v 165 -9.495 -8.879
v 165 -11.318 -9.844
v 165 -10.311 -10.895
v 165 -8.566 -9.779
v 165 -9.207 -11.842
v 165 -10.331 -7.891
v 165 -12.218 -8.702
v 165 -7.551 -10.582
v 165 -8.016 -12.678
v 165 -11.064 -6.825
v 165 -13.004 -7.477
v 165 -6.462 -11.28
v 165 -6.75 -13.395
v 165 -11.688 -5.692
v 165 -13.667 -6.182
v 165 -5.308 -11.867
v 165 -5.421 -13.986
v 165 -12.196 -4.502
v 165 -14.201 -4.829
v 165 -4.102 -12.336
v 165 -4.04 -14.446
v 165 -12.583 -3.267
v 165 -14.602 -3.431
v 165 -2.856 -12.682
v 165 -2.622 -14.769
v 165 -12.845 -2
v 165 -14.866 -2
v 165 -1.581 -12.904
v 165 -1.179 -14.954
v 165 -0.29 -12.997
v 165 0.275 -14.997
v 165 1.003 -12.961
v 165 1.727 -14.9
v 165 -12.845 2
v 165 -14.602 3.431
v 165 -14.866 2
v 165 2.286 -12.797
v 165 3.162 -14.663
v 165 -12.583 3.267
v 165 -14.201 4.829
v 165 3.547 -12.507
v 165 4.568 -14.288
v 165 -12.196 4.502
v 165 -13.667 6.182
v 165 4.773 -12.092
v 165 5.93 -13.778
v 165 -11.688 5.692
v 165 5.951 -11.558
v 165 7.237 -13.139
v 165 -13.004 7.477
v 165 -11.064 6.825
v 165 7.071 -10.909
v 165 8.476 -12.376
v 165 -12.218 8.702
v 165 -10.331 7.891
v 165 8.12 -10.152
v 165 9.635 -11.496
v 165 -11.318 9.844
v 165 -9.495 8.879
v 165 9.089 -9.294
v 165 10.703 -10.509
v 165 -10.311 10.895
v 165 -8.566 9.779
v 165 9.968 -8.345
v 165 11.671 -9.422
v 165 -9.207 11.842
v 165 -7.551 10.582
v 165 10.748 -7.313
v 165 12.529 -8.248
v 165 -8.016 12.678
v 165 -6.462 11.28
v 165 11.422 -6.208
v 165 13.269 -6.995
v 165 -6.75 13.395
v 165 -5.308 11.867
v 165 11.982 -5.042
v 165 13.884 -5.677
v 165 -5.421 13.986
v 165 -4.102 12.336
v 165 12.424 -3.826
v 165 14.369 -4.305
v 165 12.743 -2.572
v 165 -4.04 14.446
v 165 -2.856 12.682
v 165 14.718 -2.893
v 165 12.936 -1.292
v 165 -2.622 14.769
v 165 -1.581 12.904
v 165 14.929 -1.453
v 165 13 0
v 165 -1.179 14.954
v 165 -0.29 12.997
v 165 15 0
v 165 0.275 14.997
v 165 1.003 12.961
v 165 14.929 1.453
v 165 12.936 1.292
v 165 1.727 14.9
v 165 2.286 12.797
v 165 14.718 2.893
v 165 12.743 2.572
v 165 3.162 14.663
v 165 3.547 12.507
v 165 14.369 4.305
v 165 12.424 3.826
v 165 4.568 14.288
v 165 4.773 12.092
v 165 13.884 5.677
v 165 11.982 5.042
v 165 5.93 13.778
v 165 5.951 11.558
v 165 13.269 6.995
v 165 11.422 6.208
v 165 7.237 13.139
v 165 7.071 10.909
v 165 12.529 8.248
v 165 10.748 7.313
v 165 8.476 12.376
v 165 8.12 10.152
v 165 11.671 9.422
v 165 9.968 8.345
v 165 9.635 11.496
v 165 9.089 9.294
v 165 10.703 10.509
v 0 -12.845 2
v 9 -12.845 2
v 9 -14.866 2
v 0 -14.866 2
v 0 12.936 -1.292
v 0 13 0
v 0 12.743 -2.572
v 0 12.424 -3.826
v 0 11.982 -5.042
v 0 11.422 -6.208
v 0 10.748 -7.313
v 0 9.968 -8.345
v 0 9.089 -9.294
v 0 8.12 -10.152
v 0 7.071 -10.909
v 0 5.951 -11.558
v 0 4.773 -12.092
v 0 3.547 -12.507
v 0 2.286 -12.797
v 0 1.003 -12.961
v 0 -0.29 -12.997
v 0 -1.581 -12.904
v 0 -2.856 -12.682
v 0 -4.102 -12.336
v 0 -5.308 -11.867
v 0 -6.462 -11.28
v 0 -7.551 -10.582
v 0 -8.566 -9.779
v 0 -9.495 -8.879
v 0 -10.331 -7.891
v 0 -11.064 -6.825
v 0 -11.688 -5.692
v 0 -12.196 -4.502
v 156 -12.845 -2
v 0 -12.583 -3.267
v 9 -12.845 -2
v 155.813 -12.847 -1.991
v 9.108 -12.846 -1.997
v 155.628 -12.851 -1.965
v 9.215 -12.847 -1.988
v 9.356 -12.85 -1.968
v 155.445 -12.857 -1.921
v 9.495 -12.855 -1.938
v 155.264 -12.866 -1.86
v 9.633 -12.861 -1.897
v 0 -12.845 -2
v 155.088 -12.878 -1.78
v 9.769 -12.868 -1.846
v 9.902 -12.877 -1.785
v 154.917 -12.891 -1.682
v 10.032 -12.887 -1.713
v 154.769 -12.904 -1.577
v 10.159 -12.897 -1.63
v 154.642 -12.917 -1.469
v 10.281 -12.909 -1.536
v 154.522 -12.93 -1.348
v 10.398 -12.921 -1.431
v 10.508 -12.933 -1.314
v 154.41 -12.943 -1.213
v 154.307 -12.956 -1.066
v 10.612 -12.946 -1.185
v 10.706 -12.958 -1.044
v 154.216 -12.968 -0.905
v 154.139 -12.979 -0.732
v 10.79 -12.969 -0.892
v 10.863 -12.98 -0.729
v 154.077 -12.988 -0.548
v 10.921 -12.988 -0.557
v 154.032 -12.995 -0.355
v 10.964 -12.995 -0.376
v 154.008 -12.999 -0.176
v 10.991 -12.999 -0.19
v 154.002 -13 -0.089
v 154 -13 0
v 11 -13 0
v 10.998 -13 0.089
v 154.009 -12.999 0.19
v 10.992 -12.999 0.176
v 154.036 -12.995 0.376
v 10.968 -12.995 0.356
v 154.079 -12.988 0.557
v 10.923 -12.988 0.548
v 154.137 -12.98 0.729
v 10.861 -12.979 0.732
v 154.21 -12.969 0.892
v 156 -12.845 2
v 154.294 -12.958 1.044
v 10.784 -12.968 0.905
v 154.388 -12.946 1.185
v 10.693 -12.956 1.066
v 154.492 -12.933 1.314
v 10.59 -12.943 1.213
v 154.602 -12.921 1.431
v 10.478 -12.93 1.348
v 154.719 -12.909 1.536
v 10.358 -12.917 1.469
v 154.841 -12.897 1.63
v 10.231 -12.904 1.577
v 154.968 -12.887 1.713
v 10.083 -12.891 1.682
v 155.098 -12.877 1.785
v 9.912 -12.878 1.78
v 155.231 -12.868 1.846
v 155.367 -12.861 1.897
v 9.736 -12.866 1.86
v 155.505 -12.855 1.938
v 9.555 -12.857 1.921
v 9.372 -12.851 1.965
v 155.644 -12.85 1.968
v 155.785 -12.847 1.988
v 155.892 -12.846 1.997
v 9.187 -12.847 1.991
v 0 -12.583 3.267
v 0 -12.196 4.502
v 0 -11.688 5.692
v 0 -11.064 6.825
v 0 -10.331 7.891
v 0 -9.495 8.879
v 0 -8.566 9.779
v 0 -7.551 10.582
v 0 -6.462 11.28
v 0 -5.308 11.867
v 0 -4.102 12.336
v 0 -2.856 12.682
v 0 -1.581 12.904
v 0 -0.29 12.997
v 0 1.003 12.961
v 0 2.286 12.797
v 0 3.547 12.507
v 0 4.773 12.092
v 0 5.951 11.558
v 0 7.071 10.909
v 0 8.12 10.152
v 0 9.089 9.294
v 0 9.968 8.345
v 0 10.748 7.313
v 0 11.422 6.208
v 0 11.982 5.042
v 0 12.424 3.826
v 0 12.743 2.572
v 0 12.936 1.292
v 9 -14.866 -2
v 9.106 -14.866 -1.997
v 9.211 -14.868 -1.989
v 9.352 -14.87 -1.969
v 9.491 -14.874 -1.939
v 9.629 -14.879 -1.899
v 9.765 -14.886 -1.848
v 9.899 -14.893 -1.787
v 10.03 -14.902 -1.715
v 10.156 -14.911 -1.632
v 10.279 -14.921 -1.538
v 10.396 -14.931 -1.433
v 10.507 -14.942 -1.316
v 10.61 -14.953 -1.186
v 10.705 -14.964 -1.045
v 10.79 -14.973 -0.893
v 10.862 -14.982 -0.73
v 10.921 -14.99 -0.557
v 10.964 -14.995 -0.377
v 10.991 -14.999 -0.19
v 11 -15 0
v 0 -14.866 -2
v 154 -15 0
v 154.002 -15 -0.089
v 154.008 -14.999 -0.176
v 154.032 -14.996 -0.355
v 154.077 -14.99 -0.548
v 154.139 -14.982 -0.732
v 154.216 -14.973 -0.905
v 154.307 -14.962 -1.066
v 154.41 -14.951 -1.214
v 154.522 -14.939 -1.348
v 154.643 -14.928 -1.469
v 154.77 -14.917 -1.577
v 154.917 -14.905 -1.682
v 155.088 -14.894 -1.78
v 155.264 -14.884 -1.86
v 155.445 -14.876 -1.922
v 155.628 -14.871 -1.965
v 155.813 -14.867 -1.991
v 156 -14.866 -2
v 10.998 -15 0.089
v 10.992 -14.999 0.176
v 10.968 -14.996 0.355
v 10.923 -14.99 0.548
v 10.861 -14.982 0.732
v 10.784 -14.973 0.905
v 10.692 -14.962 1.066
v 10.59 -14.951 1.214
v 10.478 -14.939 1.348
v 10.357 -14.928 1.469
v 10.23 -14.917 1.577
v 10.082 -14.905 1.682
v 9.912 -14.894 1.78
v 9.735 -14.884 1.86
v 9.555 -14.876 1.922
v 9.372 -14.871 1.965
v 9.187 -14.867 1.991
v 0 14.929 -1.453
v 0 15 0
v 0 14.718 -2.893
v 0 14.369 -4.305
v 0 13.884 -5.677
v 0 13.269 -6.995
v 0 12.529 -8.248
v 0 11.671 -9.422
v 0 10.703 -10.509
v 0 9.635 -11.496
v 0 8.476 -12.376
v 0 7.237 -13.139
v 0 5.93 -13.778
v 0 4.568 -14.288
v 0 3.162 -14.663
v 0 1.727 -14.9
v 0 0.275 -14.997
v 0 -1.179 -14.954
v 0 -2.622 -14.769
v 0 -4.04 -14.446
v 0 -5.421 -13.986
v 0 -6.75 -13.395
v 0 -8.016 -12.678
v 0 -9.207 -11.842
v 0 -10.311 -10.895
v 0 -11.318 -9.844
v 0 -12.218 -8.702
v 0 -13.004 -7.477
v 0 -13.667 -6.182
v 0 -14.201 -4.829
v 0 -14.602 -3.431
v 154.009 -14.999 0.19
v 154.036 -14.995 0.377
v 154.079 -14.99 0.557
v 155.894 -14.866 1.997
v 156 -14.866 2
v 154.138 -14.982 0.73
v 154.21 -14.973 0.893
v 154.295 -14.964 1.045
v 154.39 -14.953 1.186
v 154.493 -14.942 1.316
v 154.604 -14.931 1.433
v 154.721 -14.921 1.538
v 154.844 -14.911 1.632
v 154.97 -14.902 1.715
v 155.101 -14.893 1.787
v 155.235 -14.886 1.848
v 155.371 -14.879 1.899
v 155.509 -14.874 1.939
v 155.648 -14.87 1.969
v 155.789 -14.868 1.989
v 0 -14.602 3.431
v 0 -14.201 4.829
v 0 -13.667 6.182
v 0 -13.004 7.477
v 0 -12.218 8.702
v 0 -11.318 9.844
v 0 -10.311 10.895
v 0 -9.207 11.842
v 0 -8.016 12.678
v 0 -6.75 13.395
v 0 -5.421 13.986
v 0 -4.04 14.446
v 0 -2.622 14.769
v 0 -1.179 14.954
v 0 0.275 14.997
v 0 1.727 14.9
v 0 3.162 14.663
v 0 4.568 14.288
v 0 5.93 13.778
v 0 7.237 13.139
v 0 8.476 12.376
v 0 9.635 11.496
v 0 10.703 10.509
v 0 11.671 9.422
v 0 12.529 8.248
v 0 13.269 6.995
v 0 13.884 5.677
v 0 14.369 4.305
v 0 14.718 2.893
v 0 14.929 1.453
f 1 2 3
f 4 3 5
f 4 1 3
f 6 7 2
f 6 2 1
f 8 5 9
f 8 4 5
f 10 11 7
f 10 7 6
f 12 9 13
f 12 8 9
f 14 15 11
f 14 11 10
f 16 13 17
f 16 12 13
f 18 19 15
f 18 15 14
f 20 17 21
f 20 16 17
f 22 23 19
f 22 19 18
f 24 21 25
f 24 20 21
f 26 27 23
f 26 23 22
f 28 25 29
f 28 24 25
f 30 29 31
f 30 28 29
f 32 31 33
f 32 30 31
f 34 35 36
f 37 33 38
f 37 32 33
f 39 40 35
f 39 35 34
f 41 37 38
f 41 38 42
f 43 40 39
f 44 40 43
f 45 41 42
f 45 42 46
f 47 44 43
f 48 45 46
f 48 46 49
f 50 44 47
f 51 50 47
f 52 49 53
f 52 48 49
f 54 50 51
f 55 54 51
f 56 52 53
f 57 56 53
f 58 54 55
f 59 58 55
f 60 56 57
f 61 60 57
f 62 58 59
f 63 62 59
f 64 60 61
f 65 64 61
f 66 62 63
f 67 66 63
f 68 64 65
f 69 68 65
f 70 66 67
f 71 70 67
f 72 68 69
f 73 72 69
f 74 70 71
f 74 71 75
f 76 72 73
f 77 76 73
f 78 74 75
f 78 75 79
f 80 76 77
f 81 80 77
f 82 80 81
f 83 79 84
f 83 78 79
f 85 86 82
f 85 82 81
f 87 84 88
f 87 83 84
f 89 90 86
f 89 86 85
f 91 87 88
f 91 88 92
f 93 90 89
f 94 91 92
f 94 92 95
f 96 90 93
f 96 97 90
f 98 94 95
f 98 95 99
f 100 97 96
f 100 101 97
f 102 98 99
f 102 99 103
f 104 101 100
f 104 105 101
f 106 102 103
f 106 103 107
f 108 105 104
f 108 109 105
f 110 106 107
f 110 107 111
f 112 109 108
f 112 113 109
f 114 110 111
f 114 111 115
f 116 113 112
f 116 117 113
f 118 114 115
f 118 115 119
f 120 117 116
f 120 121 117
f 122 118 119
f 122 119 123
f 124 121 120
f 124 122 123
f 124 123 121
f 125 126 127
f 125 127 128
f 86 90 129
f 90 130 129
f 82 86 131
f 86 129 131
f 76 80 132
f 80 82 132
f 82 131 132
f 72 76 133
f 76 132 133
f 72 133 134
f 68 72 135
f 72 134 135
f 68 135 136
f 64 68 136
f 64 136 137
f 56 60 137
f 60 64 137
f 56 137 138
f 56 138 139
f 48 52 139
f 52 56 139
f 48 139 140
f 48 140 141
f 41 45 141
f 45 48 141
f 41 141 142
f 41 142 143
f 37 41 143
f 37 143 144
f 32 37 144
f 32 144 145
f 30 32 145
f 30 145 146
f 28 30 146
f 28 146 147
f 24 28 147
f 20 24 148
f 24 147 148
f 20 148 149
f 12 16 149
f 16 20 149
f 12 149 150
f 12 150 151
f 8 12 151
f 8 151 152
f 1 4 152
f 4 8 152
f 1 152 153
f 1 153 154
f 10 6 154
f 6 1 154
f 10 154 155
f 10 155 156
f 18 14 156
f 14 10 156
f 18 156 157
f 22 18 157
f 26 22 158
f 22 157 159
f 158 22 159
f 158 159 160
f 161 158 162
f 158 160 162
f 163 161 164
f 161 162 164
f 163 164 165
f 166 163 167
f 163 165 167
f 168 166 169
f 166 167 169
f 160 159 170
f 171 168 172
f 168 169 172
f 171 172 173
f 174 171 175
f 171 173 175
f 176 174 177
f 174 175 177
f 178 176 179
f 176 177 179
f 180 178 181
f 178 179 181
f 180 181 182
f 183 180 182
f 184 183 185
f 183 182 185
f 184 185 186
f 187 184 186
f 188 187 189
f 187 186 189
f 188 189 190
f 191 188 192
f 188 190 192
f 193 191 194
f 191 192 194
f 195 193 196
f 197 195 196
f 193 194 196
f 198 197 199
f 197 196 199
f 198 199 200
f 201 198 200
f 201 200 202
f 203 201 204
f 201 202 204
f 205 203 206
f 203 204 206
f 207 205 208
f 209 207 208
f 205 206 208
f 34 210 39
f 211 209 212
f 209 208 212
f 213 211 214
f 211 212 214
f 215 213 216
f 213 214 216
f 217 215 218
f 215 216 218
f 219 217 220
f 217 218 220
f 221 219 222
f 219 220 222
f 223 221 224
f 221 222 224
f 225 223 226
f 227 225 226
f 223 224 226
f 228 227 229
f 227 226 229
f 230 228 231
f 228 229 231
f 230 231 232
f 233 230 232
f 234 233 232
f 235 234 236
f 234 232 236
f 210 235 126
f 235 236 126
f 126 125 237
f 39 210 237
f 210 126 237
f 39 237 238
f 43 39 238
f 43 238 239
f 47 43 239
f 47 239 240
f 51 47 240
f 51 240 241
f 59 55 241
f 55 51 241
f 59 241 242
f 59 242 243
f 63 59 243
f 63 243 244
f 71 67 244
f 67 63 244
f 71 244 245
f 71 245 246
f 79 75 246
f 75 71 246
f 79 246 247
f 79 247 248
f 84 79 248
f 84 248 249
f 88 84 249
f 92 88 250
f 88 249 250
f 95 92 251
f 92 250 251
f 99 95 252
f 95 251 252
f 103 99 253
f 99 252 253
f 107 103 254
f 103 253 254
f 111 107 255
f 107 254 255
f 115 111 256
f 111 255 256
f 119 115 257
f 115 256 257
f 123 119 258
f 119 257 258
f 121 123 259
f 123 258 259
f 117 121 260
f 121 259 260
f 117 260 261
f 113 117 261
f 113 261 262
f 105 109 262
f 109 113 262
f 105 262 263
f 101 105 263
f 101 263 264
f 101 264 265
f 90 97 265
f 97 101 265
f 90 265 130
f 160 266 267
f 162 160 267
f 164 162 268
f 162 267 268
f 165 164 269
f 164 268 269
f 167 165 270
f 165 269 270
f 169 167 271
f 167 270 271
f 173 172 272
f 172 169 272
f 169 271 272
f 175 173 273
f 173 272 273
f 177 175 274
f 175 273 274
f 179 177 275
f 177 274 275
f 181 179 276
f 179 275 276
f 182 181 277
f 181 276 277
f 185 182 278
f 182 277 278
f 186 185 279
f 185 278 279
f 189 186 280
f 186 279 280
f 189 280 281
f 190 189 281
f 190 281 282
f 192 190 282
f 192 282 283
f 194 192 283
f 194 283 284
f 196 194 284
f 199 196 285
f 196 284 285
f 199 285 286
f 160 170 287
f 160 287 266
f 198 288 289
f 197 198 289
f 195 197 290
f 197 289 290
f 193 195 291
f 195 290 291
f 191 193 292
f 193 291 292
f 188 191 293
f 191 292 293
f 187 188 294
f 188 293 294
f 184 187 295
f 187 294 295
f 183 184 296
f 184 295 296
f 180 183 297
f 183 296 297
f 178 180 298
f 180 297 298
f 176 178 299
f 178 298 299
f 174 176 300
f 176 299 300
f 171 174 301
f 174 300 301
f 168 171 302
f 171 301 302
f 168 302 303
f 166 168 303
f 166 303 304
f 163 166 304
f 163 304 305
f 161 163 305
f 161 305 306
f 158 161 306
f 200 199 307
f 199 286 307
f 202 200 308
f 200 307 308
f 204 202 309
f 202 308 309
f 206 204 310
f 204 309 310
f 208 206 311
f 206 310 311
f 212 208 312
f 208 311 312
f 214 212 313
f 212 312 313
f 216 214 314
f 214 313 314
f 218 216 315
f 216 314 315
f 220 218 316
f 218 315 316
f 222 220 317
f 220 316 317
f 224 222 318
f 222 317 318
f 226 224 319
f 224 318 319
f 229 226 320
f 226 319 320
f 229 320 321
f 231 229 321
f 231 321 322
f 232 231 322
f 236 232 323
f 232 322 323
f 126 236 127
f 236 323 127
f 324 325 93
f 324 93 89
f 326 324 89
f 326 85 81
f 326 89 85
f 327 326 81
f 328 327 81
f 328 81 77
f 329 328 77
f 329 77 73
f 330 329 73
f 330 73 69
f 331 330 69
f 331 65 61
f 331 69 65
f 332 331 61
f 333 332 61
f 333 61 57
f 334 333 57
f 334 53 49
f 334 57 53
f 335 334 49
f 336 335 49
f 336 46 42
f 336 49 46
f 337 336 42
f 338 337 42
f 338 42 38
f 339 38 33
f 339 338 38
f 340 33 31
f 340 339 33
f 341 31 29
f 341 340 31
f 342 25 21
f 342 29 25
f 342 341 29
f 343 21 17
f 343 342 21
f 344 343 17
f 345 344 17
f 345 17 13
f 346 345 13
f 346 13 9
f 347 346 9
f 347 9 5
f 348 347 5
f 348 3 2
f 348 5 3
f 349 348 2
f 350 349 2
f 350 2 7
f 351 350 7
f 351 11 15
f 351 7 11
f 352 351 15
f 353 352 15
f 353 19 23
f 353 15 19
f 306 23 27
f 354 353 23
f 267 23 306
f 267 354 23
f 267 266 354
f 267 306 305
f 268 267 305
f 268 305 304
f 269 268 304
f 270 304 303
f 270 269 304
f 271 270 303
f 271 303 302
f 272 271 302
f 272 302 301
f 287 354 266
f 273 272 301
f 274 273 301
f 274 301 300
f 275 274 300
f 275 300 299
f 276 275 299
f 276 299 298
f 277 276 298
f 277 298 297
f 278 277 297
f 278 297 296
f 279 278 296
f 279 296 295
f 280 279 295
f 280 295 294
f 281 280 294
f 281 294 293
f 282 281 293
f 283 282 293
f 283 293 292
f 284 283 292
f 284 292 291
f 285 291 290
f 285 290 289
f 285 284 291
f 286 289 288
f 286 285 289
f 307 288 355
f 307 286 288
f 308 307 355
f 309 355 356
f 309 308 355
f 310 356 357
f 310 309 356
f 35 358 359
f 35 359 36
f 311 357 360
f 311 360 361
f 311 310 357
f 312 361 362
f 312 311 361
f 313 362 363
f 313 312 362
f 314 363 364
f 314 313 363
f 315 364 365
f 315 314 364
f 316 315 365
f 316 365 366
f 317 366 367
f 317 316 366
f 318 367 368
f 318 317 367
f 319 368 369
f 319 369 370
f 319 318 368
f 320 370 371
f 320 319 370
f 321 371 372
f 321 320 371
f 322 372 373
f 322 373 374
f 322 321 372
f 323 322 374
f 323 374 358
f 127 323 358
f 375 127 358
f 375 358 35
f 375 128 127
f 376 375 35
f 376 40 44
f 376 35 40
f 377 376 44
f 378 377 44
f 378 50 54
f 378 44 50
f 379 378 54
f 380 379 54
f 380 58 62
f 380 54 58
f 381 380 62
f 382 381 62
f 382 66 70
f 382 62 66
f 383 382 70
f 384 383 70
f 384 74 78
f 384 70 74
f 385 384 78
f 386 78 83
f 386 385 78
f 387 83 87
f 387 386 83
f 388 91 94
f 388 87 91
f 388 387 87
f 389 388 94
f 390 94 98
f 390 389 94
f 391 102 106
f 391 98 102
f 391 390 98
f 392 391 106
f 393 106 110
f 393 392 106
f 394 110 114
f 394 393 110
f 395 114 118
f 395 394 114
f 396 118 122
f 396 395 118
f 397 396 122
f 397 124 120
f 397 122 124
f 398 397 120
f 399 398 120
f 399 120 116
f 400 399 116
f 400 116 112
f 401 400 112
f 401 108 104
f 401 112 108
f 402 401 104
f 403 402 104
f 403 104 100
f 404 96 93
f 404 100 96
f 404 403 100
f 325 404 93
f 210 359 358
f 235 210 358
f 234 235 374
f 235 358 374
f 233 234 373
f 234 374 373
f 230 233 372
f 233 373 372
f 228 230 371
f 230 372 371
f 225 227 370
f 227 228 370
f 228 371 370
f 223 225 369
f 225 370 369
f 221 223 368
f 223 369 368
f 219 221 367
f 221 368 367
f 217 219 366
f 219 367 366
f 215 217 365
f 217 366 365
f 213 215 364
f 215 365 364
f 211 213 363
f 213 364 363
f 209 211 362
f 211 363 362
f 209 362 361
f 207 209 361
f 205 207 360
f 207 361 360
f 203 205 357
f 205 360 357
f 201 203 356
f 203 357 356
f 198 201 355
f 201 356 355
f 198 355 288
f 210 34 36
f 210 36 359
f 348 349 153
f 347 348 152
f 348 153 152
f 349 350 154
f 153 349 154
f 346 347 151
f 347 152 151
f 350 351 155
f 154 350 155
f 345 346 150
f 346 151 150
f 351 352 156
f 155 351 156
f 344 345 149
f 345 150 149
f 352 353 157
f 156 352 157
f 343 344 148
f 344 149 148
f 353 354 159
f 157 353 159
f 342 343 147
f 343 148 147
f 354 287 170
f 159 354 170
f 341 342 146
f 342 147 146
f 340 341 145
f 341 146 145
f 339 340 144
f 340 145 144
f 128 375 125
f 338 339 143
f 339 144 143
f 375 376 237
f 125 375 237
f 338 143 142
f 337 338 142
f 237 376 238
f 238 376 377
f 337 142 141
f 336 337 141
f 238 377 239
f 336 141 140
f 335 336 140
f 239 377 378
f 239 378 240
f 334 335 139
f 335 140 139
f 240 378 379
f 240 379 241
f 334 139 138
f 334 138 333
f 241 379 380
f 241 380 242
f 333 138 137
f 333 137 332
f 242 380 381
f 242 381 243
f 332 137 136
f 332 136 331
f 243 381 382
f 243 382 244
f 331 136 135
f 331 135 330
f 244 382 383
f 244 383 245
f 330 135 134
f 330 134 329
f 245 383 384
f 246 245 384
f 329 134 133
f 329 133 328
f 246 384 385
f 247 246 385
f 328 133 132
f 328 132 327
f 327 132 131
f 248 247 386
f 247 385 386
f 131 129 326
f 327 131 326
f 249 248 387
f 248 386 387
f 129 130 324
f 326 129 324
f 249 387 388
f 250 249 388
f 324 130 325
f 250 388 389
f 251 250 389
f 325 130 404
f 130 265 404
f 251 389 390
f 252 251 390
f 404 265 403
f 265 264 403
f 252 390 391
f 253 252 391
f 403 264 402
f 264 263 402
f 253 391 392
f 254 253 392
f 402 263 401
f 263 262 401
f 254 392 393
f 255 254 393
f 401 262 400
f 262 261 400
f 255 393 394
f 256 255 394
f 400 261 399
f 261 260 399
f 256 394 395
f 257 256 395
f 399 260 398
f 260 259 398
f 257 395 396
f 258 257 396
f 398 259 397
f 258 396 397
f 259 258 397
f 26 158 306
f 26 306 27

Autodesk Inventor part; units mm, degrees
ref_plane "YZ Plane" through (0, 0, 0) normal (1, 0, 0) x (0, 1, 0)
sketch "Sketch1" plane through (0, 0, 0) normal (1, 0, 0) x (0, 1, 0)
  circle A0 centre (0, 0) radius 15
  circle A1 centre (0, 0) radius 13
  dimension "d0" = 30
  dimension "d1" = 26
extrude "Extrusion1" add sketch "Sketch1" along normal blind 165
sketch "Sketch2" plane through (0, 0, 0) normal (0, 1, 0) x (-1, 0, 0)
  line L0 (0, 0) -> (-165, 0) construction
  line L1 (-165, 15) -> (-165, -15) construction
  line L2 (-11, 2) -> (0, 2)
  line L3 (0, 2) -> (0, -2)
  line L4 (0, -2) -> (-11, -2)
  line L5 (-11, -2) -> (-11, 2)
  line L6 (-11, 2) -> (0, -2)
  line L7 (0, 2) -> (-11, -2)
  line L8 (0, -15) -> (0, 15) projected
  line L9 (0, 15) -> (0, -15)
  line L10 (0, -15) -> (-165, -15) projected
  point P0 (-5.5, 0)
  dimension "d4" = 4
  dimension "d5" = 11
extrude "Extrusion2" cut sketch "Sketch2" against normal through all
fillet "Fillet1" radius 2 2 edges at (11, -13.8557, 2) (11, -13.8557, -2)
ref_plane "Work Plane1" through (82.5, 0, 0) normal (-1, 0, 0) x (0, 0, 1)
mirror "Mirror1" about plane through (82.5, 0, 0) normal (-1, 0, 0) of "Extrusion2", "Fillet1"
ref_plane "Work Plane2" through (0, -15, 0) normal (0, 1, 0) x (-1, 0, 0)
properties part number "Laser_tube" material "Polycarbonate, Clear"
